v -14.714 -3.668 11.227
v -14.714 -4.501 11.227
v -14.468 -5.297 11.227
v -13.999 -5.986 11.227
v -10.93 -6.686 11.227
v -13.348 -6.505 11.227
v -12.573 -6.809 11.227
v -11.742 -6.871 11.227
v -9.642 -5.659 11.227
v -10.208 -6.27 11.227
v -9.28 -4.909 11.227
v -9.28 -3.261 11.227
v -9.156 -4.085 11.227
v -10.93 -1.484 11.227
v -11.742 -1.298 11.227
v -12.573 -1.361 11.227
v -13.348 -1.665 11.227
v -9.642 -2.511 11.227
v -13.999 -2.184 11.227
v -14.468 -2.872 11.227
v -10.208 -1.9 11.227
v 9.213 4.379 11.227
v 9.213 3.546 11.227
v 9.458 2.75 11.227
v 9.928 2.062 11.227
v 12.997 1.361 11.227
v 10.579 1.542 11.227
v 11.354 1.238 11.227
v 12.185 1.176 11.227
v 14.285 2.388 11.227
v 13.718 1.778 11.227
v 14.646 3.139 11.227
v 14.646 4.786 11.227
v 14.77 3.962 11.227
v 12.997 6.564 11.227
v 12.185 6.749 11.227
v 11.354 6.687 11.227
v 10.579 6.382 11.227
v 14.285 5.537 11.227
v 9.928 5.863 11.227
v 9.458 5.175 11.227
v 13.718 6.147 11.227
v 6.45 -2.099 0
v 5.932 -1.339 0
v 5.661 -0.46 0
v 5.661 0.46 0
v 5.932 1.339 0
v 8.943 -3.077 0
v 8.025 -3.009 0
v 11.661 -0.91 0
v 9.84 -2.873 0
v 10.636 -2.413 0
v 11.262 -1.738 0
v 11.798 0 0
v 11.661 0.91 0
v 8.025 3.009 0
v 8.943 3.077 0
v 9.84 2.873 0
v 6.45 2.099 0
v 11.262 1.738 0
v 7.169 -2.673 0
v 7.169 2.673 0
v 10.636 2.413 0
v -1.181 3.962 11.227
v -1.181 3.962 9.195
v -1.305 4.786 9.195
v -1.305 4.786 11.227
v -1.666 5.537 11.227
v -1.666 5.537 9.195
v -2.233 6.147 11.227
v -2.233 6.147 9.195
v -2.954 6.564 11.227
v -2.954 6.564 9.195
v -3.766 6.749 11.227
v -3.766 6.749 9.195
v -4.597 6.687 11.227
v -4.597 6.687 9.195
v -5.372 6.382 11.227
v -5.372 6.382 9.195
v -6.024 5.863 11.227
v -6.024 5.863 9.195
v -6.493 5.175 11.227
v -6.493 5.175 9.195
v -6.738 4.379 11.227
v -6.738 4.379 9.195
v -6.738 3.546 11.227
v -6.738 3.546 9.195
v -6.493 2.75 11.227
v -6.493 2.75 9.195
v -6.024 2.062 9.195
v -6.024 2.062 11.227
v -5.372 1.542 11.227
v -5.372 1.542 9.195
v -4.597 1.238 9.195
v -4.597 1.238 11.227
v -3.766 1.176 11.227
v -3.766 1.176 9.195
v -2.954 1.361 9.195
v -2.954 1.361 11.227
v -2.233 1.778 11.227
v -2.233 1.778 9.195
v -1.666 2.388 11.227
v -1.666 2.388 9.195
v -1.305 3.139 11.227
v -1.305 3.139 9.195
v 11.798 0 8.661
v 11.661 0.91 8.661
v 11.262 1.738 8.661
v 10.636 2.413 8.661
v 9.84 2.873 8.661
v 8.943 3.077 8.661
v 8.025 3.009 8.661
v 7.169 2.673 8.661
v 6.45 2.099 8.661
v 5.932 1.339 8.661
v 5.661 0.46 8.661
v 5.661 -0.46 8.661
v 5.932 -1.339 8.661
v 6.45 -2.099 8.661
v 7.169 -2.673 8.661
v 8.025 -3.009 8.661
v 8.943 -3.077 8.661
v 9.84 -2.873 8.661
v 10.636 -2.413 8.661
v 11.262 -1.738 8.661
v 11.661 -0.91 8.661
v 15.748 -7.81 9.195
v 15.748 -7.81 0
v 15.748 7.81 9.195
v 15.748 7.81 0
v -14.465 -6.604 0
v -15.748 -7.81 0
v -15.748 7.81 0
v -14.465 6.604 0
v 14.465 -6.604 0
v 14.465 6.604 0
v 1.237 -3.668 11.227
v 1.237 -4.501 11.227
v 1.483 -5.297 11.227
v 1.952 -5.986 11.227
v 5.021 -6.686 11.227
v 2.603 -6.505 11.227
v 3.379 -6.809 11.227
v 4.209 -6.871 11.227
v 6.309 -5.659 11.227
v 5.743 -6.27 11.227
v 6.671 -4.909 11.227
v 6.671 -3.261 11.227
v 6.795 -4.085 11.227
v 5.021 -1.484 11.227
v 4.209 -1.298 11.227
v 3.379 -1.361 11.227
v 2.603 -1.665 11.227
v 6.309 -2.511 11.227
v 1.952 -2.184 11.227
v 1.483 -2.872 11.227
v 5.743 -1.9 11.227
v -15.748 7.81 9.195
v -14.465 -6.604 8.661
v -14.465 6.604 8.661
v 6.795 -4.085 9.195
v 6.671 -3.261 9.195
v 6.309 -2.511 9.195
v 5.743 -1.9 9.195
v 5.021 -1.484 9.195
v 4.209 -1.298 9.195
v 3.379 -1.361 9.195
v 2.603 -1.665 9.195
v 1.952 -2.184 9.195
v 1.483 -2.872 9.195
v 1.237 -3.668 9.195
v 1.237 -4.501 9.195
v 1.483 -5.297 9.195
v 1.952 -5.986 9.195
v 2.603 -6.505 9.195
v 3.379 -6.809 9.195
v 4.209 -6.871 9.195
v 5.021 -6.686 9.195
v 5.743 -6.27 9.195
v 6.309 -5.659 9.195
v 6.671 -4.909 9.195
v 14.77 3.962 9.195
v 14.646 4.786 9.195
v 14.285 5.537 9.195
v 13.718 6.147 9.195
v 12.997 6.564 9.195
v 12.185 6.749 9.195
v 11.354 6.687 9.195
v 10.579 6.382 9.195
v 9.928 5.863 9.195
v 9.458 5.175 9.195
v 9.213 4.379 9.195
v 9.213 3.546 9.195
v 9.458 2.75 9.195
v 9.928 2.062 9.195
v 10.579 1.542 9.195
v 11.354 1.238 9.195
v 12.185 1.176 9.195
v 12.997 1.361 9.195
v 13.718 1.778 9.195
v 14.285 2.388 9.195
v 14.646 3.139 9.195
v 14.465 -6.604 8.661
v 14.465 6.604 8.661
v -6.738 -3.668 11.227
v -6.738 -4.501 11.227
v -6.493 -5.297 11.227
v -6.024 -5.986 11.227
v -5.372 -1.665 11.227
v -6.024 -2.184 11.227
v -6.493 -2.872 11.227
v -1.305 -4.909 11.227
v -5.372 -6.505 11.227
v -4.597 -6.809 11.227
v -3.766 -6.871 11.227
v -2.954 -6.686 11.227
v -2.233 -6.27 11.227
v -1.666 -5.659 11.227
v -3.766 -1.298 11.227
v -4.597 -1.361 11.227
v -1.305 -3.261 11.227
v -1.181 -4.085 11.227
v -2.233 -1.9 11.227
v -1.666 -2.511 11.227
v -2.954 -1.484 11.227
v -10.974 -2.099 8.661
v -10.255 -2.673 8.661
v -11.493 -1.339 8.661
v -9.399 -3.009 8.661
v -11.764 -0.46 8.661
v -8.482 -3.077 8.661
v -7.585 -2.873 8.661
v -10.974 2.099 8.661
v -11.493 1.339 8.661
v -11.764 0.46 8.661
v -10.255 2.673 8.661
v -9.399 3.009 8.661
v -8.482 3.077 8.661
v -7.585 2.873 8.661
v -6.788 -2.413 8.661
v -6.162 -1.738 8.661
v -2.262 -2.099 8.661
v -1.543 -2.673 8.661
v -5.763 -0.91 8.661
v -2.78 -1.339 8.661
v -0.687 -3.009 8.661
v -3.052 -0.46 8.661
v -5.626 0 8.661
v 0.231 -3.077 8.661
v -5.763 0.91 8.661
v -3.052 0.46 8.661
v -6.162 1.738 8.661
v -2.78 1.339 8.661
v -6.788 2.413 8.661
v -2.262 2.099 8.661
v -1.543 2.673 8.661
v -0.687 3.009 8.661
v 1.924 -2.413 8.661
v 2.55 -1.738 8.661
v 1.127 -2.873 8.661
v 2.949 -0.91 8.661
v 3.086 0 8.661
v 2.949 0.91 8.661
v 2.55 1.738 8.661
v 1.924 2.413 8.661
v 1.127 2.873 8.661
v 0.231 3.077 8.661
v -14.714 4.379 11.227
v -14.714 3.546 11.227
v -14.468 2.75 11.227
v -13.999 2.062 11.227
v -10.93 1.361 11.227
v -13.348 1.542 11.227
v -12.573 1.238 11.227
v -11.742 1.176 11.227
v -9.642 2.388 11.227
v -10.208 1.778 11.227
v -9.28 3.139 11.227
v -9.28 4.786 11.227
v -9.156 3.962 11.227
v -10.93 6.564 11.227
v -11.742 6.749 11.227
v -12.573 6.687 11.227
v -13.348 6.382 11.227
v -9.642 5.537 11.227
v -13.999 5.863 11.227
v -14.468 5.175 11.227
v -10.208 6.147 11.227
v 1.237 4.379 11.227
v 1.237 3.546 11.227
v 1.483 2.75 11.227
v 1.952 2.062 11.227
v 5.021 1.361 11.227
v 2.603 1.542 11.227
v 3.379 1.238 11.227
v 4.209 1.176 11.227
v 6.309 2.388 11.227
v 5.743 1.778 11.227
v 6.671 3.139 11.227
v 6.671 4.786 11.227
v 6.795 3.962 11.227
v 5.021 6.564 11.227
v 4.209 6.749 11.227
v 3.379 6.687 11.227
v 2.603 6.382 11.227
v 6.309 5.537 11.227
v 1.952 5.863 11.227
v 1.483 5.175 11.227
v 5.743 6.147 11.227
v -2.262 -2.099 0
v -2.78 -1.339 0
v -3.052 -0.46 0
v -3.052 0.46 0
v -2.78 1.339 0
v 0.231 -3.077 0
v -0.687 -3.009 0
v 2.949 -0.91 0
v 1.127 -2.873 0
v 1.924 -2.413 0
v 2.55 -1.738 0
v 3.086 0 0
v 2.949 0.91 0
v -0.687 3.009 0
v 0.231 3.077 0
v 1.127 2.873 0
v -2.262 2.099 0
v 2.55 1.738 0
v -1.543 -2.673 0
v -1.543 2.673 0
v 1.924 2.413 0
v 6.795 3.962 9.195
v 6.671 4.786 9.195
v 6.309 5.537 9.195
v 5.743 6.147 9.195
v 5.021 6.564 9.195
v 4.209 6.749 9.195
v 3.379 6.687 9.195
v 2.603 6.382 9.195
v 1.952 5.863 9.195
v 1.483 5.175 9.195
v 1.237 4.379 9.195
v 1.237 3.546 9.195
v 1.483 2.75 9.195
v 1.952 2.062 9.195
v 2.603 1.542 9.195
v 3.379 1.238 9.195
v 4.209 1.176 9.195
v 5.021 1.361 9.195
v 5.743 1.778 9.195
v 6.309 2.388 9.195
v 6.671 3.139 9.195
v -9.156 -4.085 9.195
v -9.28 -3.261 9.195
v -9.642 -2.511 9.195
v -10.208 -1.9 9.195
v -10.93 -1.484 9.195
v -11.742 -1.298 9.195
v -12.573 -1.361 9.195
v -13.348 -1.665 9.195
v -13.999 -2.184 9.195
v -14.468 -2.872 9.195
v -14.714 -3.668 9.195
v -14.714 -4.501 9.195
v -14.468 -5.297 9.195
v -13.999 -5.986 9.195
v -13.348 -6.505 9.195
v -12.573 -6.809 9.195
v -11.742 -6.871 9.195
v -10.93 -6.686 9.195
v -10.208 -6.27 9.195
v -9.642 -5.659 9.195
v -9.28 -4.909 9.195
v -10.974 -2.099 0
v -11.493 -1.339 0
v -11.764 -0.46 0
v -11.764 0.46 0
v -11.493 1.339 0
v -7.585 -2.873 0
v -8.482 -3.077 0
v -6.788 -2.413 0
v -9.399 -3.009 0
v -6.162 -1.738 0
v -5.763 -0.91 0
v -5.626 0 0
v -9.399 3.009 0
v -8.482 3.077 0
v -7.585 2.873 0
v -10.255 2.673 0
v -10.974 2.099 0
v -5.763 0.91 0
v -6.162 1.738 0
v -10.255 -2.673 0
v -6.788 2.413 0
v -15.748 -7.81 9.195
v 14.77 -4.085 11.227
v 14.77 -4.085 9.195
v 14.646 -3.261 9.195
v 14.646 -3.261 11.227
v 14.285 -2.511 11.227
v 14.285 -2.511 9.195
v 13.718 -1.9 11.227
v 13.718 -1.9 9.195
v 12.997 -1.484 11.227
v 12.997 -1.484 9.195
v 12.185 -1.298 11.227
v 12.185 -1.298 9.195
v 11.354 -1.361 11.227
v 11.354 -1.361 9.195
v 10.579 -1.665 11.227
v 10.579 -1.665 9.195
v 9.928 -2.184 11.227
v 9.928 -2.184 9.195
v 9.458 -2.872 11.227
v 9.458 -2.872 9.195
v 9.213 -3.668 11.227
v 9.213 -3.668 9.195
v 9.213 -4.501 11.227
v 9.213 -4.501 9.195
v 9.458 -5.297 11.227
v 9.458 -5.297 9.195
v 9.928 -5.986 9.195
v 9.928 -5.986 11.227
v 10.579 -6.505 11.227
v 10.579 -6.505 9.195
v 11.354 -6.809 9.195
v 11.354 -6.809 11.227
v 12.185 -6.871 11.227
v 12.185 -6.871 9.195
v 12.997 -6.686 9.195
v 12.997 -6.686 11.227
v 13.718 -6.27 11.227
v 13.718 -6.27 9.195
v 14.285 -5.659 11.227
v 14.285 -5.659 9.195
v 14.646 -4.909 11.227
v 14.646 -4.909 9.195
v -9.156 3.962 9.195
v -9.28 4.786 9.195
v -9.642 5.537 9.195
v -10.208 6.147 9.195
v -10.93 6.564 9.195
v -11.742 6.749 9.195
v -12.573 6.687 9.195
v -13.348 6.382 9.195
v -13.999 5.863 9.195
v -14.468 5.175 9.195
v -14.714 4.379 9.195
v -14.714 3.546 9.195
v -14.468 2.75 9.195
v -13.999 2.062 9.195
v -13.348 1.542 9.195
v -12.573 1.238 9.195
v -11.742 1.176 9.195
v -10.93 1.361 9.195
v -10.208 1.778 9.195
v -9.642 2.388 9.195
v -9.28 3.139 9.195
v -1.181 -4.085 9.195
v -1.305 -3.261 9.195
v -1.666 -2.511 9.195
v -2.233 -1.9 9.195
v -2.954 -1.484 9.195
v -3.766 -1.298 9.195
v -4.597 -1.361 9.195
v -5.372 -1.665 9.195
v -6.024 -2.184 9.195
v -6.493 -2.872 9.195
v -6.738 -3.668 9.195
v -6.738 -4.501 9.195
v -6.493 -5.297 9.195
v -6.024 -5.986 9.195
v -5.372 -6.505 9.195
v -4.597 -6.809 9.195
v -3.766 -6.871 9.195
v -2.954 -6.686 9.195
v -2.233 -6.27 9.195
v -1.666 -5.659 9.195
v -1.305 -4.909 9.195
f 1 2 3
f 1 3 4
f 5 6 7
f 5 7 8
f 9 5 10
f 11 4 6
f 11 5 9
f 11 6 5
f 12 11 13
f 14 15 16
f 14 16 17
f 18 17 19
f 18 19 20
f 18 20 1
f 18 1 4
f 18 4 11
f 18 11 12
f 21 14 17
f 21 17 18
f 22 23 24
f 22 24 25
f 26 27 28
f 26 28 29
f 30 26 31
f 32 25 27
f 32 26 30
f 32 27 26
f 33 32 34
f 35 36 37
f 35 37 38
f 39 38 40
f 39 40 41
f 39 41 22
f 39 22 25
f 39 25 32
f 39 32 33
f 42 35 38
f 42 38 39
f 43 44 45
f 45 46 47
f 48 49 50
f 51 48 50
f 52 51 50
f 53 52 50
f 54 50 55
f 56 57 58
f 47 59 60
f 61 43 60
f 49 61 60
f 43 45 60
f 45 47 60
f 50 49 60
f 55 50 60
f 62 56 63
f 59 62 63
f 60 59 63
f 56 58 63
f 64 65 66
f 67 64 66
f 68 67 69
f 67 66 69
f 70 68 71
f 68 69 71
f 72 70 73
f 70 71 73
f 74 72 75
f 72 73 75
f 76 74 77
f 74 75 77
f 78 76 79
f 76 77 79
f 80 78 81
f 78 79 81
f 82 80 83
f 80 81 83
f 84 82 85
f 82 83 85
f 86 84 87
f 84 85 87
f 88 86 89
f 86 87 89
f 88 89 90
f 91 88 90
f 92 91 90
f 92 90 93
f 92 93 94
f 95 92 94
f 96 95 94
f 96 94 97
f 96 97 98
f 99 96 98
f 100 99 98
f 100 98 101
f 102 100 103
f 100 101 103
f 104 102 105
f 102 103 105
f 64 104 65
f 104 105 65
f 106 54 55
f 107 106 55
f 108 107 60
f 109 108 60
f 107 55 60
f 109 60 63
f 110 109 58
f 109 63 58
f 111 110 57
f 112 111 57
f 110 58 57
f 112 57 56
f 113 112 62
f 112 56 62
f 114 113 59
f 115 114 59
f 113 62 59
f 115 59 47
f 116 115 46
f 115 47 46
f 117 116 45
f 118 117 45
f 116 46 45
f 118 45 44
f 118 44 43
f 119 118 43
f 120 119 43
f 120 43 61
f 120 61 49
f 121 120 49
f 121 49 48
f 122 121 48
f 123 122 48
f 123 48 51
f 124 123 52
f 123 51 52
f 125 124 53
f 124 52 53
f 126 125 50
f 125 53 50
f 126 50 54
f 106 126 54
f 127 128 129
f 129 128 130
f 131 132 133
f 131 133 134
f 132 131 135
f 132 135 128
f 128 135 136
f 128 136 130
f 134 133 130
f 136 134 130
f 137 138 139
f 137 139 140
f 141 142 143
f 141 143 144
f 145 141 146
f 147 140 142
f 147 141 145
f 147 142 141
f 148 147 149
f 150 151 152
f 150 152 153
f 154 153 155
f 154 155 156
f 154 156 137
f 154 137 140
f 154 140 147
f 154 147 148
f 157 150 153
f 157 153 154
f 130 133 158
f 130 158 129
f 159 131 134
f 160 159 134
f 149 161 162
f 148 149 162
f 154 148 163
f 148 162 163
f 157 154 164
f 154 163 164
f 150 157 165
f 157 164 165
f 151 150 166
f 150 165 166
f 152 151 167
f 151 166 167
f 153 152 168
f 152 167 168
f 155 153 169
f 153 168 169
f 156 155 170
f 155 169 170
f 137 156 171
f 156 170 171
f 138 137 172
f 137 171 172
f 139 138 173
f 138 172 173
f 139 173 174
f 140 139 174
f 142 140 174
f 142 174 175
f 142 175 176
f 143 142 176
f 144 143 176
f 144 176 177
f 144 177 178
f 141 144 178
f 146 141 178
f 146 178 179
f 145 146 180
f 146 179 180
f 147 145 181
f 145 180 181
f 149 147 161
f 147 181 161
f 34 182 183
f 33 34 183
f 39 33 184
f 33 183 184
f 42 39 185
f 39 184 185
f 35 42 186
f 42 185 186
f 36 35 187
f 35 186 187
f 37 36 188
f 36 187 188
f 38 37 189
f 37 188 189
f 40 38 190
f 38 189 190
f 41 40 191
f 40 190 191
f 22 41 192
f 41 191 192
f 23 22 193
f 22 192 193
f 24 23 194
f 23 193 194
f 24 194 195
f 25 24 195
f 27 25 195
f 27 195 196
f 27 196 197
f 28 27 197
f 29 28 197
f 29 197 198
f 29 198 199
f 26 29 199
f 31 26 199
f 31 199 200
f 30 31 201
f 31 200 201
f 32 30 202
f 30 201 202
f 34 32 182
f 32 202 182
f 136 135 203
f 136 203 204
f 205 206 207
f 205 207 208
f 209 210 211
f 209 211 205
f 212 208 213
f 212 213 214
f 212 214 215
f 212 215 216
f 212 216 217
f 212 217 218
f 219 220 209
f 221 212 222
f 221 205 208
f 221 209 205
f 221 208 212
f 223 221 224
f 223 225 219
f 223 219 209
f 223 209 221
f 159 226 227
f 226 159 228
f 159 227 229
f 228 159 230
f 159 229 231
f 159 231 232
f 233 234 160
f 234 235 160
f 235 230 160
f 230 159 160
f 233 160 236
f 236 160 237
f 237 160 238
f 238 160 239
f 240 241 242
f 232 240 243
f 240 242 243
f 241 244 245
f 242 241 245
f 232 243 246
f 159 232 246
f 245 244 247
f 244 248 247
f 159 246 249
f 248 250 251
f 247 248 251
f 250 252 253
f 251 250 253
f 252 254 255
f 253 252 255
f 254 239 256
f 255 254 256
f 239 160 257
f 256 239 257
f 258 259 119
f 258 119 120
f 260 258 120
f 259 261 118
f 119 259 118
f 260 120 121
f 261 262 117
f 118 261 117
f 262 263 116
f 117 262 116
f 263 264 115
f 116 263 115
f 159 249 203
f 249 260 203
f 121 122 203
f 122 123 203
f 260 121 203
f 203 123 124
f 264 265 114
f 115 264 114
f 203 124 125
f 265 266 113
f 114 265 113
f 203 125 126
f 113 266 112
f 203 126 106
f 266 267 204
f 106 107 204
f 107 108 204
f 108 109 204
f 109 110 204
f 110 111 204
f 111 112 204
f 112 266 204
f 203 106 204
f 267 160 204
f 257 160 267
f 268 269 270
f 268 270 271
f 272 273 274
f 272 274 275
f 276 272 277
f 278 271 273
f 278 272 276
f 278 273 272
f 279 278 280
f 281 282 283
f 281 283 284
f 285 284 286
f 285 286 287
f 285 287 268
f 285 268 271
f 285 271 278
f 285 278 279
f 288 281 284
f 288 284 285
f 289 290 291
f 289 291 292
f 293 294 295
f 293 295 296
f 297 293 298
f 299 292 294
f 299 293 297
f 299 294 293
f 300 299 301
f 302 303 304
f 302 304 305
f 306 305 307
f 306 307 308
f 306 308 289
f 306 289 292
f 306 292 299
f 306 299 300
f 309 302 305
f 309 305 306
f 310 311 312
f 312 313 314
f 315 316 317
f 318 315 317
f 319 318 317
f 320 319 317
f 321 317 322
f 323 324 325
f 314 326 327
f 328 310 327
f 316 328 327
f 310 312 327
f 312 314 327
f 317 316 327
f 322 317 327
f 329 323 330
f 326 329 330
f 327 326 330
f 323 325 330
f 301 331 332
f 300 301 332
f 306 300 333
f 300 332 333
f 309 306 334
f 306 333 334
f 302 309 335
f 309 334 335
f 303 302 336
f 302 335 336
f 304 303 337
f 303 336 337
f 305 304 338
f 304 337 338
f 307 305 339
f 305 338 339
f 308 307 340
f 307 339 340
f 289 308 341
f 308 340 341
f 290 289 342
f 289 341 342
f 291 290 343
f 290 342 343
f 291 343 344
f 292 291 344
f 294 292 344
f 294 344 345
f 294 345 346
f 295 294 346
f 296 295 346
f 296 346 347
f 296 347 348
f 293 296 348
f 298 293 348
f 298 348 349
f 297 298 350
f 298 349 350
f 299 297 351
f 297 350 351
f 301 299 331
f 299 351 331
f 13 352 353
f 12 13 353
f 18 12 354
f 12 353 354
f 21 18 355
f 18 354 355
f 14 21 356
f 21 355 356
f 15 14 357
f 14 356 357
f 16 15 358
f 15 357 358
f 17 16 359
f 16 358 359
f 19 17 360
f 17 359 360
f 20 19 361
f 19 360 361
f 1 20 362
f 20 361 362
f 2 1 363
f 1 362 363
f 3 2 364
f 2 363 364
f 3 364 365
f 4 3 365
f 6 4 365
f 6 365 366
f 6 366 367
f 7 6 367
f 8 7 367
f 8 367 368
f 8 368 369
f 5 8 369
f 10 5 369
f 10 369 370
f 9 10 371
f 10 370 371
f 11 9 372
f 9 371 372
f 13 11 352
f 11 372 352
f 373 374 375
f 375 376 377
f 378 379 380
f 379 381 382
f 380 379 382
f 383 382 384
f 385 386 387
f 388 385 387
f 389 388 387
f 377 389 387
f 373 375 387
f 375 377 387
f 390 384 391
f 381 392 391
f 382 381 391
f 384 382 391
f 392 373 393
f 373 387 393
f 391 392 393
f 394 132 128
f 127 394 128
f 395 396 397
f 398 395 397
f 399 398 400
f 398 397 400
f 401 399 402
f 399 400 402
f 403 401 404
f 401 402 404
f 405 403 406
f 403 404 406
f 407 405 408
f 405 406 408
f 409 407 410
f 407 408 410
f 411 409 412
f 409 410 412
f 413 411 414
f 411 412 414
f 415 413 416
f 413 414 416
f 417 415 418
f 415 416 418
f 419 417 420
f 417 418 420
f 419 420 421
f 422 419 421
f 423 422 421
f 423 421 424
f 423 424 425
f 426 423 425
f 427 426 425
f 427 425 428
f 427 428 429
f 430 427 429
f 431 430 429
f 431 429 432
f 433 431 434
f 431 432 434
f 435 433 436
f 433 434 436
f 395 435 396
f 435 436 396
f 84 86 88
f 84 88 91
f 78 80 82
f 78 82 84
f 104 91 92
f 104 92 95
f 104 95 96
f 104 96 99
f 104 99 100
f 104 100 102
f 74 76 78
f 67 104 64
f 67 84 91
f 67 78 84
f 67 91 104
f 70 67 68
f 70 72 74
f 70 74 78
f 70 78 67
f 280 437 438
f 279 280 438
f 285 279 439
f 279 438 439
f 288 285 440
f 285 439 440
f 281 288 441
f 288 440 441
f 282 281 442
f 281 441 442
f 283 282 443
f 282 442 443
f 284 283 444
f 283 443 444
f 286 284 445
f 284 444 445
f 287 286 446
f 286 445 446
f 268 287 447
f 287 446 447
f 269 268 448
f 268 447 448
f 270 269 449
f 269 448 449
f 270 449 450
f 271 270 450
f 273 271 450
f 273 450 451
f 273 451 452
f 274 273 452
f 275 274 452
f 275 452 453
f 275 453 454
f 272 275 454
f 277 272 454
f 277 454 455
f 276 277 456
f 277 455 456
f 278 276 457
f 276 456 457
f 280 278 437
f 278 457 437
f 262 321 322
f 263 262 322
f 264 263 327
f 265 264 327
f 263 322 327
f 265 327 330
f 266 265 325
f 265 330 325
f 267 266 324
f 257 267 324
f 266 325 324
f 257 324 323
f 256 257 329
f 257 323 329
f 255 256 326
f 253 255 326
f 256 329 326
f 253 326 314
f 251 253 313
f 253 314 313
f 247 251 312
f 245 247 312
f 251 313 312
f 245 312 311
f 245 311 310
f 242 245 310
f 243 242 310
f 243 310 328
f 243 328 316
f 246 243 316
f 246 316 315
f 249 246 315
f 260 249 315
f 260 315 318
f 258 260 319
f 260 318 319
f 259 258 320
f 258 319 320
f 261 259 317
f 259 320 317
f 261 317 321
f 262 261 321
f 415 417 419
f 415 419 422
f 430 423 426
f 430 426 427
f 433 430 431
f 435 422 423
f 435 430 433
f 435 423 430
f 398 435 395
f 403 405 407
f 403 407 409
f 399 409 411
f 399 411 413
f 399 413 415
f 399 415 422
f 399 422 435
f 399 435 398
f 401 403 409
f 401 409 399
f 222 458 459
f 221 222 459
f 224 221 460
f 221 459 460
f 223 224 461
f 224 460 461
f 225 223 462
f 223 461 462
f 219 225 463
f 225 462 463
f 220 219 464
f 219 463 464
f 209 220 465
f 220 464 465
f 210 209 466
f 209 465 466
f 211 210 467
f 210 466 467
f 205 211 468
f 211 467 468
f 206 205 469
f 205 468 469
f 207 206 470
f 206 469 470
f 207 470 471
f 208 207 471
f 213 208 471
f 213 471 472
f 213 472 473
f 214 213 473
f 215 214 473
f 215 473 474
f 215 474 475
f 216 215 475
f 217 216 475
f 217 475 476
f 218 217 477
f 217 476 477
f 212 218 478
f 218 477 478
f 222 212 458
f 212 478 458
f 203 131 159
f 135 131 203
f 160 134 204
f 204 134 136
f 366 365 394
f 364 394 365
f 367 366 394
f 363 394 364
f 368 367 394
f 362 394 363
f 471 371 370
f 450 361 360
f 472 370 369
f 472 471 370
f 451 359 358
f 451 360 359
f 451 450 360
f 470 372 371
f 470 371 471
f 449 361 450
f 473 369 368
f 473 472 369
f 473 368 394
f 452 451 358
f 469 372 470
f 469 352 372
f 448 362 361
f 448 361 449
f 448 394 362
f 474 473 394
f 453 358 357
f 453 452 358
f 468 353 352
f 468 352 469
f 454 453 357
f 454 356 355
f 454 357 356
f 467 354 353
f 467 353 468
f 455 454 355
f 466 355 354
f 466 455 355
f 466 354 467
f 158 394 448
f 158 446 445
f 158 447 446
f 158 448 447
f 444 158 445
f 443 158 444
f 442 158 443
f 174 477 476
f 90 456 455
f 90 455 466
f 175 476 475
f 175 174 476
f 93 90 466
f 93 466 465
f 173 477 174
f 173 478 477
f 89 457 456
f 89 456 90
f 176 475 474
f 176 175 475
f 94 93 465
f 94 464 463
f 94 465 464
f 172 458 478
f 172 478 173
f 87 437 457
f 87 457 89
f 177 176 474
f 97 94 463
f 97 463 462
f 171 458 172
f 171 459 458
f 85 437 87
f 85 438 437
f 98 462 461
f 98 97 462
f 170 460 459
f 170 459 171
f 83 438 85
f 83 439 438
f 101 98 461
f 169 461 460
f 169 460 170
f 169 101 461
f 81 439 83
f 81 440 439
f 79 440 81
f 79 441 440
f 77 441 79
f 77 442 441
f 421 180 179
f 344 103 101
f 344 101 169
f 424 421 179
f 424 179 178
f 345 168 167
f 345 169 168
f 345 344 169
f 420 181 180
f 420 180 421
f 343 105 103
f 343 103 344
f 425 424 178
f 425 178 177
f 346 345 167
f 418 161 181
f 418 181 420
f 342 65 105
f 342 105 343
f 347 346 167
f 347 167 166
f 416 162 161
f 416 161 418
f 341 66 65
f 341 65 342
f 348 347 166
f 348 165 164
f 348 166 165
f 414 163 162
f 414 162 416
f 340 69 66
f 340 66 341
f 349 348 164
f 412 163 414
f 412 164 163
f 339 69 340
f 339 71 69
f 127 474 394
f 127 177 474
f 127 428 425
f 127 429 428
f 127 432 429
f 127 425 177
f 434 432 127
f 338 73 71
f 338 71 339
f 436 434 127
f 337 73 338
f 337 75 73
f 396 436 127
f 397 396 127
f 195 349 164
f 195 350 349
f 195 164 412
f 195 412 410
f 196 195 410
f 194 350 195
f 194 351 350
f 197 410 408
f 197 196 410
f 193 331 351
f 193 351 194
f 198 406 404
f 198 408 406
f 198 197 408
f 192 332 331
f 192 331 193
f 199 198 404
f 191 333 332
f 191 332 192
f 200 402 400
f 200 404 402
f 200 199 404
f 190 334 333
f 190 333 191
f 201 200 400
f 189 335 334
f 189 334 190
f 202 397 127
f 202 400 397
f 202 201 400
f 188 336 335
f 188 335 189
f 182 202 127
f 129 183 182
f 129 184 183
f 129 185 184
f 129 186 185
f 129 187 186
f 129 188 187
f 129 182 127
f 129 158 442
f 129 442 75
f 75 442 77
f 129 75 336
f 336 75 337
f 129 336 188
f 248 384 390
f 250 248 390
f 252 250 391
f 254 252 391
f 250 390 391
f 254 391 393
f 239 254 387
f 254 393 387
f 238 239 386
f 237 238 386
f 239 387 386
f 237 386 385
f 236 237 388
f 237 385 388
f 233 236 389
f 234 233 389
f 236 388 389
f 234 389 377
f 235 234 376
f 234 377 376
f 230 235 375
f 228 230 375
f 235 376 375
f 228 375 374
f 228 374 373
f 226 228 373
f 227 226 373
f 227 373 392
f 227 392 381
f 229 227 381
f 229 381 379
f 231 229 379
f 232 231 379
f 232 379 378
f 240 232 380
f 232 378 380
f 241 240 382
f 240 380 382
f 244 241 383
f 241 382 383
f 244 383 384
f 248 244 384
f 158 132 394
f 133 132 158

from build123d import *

# Parameters (mm, degrees)
F0_W     = 31.496
F0_H     = 15.621
F1_DEPTH = 9.1948
F3_R     = 2.79439
F4_DEPTH = 2.032
F5_W     = 28.9306
F5_H     = 13.208
F6_DEPTH = 8.6614
F7_R     = 3.0861
F8_DEPTH = 8.6614


with BuildPart() as f1:
    # F0 (on Top) → F1 (new body)
    with BuildSketch(Plane.XY):
        Rectangle(F0_W, F0_H)
    extrude(amount=F1_DEPTH)

    # F3 (on offset) → F4 (join)
    with BuildSketch(Plane.XY.offset(9.1948)):
        with Locations((-11.9507, 3.9624)):
            Circle(F3_R)
        with Locations((-3.9751, 3.9624)):
            Circle(F3_R)
        with Locations((4.0005, 3.9624)):
            Circle(F3_R)
        with Locations((11.9761, 3.9624)):
            Circle(F3_R)
        with Locations((-11.9507, -4.08486)):
            Circle(F3_R)
        with Locations((-3.9751, -4.08486)):
            Circle(F3_R)
        with Locations((4.0005, -4.08486)):
            Circle(F3_R)
        with Locations((11.9761, -4.08486)):
            Circle(F3_R)
    extrude(amount=F4_DEPTH)

    # F5 (on Top) → F6 (cut)
    with BuildSketch(Plane.XY):
        Rectangle(F5_W, F5_H)
    extrude(amount=F6_DEPTH, mode=Mode.SUBTRACT)

    # F7 (on Top) → F8 (join)
    with BuildSketch(Plane.XY):
        Circle(F7_R)
        with Locations((8.7122, 0)):
            Circle(F7_R)
        with Locations((-8.7122, 0)):
            Circle(F7_R)
    extrude(amount=F8_DEPTH)


solid = f1.part
